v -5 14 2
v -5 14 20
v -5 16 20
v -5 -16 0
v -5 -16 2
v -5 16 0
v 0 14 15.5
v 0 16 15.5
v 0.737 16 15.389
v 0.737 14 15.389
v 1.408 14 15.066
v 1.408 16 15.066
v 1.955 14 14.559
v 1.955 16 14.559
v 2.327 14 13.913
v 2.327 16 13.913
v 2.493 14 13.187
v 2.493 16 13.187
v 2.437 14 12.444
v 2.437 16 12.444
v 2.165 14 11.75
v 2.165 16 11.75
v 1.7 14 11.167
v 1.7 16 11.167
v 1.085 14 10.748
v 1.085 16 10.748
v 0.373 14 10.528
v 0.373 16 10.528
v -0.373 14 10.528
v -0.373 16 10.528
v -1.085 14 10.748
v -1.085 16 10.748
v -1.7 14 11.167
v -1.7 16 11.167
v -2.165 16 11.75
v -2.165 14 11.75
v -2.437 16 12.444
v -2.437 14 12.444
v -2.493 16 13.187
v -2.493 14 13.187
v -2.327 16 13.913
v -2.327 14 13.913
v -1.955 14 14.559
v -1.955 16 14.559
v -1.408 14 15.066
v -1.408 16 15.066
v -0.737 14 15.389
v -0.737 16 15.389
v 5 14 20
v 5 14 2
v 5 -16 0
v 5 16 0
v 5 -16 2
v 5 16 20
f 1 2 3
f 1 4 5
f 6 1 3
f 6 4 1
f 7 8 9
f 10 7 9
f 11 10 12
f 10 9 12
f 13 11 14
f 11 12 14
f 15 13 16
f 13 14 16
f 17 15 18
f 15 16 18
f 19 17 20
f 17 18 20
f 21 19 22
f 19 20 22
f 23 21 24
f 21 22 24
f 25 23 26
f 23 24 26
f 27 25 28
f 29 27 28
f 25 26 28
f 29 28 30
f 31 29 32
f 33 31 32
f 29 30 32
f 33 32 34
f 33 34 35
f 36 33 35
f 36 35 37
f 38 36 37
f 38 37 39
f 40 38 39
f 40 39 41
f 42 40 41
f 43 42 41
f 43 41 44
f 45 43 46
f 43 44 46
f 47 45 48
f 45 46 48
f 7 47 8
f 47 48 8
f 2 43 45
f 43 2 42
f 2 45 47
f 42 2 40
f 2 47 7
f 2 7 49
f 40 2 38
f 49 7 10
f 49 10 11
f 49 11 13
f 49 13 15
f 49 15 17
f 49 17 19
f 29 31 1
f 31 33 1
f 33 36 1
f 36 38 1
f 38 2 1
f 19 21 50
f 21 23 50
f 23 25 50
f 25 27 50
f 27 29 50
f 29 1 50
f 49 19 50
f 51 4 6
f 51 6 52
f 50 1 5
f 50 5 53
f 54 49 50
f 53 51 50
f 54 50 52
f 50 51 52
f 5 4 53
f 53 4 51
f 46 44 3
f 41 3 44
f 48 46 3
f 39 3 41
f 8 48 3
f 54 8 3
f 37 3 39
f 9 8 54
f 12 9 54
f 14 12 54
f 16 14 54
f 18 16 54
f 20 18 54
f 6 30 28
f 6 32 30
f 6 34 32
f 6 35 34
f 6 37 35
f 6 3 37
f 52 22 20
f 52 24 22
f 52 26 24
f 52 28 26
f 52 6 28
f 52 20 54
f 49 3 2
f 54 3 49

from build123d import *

# Parameters (mm, degrees)
SKETCH1_W           = 10
SKETCH1_H           = 32
BOSS_EXTRUDE1_DEPTH = 2
SKETCH2_W           = 10
SKETCH2_H           = 2
BOSS_EXTRUDE2_DEPTH = 18
SKETCH3_R           = 2.5
CUT_EXTRUDE1_DEPTH  = 2


with BuildPart() as part:
    # Sketch1 → Boss-Extrude1 (new body)
    with BuildSketch(Plane.XY):
        Rectangle(SKETCH1_W, SKETCH1_H)
    extrude(amount=BOSS_EXTRUDE1_DEPTH)

    # Sketch2 → Boss-Extrude2 (add)
    with BuildSketch(Plane.XY.offset(2)):
        with Locations((0, 15)):
            Rectangle(SKETCH2_W, SKETCH2_H)
    extrude(amount=BOSS_EXTRUDE2_DEPTH)

    # Sketch3 → Cut-Extrude1 (cut)
    with BuildSketch(Plane(origin=(0, 16, 0), x_dir=(1, 0, 0), z_dir=(0, 1, 0))):
        with Locations(Location((0, -13, 0), (0, 0, 270))):
            Circle(SKETCH3_R)
    extrude(amount=-CUT_EXTRUDE1_DEPTH, mode=Mode.SUBTRACT)


solid = part.part
